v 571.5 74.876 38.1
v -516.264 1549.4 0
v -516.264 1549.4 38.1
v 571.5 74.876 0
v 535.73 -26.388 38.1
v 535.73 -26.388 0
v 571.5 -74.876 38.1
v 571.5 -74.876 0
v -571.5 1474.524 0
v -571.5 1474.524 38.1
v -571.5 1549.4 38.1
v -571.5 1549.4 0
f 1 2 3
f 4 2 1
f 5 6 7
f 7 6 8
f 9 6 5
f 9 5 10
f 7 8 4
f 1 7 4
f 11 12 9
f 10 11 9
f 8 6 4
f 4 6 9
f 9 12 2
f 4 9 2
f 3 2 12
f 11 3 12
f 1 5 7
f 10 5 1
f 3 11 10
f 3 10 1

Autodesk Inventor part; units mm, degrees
ref_plane "YZ Plane" through (0, 0, 0) normal (1, 0, 0) x (0, 1, 0)
ref_plane "XZ Plane" through (0, 0, 0) normal (0, 1, 0) x (-1, 0, 0)
ref_plane "XY Plane" through (0, 0, 0) normal (0, 0, 1) x (1, 0, 0)
sketch "Sketch1" plane through (0, 0, 0) normal (0, 0, 1) x (1, 0, 0)
  line L0 (-571.5, -1549.4) -> (571.5, -1549.4)
  line L1 (571.5, -1549.4) -> (571.5, 1549.4)
  line L2 (571.5, 1549.4) -> (-571.5, 1549.4)
  line L3 (-571.5, 1549.4) -> (-571.5, -1549.4)
  line L4 (-571.5, -1549.4) -> (571.5, 1549.4) construction
  line L5 (571.5, -1549.4) -> (-571.5, 1549.4) construction
  line L6 (-571.5, 0) -> (571.5, 0)
  line L7 (571.5, 0) -> (-571.5, -1549.4)
  line L8 (-535.73, -1575.7877) -> (-607.27, -1523.0123)
  line L9 (607.27, -26.3877) -> (535.73, 26.3877)
  line L10 (535.73, 26.3877) -> (-607.27, -1523.0123)
  line L11 (-535.73, -1575.7877) -> (607.27, -26.3877)
  line L12 (535.73, 26.3877) -> (571.5, 74.8759)
  line L13 (-571.5, 1549.4) -> (571.5, -1549.4) construction
  line L14 (571.5, 0) -> (-571.5, 1549.4)
  line L15 (-535.73, 1575.7877) -> (-607.27, 1523.0123)
  line L16 (607.27, 26.3877) -> (535.73, -26.3877)
  line L17 (535.73, -26.3877) -> (-607.27, 1523.0123)
  line L18 (-535.73, 1575.7877) -> (607.27, 26.3877)
  line L19 (535.73, -26.3877) -> (571.5, -74.8759)
  point P0 (0, 0)
  point P1 (571.5, 74.8759)
  point P2 (-516.2637, 1549.4)
  point P3 (-571.5, 1474.5241)
  point P4 (571.5, -74.8759)
  point P5 (571.5, -74.8759)
  point P6 (516.2637, 0)
  point P7 (-571.5, -1474.5241)
  point P8 (-516.2637, -1549.4)
  point P9 (543.8818, -37.438)
  point P10 (571.5, 0)
  point P11 (571.5, 0)
  point P12 (516.2637, 0)
  point P13 (571.5, 0)
  point P14 (-571.5, 1549.4)
  point P15 (543.8818, 37.438)
  point P16 (571.5, 74.8759)
  point P17 (571.5, -74.8759)
  point P18 (571.5, 0)
  point P19 (-571.5, -1549.4)
  point P20 (516.2637, 0)
  point P21 (571.5, 0)
  point P22 (-571.5, 1549.4)
  point P23 (571.5, 0)
  point P24 (-571.5, -1549.4)
  dimension "d0" = 1143
  dimension "d1" = 3098.8
  dimension "d3" = 88.9
  dimension "d4" = 88.9
extrude "Extrusion1" add sketch "Sketch1" along normal blind 38.1 contours L19 L16 L7 | L7 L1 L19 | L10 L9 L6 | L17 L3 L14 L12 L10 | L6 L16 L17 | L14 L12 L1 | L9 L12 L14 | L12 L14 L2 L18
properties part number "S_2x4x78.175"
